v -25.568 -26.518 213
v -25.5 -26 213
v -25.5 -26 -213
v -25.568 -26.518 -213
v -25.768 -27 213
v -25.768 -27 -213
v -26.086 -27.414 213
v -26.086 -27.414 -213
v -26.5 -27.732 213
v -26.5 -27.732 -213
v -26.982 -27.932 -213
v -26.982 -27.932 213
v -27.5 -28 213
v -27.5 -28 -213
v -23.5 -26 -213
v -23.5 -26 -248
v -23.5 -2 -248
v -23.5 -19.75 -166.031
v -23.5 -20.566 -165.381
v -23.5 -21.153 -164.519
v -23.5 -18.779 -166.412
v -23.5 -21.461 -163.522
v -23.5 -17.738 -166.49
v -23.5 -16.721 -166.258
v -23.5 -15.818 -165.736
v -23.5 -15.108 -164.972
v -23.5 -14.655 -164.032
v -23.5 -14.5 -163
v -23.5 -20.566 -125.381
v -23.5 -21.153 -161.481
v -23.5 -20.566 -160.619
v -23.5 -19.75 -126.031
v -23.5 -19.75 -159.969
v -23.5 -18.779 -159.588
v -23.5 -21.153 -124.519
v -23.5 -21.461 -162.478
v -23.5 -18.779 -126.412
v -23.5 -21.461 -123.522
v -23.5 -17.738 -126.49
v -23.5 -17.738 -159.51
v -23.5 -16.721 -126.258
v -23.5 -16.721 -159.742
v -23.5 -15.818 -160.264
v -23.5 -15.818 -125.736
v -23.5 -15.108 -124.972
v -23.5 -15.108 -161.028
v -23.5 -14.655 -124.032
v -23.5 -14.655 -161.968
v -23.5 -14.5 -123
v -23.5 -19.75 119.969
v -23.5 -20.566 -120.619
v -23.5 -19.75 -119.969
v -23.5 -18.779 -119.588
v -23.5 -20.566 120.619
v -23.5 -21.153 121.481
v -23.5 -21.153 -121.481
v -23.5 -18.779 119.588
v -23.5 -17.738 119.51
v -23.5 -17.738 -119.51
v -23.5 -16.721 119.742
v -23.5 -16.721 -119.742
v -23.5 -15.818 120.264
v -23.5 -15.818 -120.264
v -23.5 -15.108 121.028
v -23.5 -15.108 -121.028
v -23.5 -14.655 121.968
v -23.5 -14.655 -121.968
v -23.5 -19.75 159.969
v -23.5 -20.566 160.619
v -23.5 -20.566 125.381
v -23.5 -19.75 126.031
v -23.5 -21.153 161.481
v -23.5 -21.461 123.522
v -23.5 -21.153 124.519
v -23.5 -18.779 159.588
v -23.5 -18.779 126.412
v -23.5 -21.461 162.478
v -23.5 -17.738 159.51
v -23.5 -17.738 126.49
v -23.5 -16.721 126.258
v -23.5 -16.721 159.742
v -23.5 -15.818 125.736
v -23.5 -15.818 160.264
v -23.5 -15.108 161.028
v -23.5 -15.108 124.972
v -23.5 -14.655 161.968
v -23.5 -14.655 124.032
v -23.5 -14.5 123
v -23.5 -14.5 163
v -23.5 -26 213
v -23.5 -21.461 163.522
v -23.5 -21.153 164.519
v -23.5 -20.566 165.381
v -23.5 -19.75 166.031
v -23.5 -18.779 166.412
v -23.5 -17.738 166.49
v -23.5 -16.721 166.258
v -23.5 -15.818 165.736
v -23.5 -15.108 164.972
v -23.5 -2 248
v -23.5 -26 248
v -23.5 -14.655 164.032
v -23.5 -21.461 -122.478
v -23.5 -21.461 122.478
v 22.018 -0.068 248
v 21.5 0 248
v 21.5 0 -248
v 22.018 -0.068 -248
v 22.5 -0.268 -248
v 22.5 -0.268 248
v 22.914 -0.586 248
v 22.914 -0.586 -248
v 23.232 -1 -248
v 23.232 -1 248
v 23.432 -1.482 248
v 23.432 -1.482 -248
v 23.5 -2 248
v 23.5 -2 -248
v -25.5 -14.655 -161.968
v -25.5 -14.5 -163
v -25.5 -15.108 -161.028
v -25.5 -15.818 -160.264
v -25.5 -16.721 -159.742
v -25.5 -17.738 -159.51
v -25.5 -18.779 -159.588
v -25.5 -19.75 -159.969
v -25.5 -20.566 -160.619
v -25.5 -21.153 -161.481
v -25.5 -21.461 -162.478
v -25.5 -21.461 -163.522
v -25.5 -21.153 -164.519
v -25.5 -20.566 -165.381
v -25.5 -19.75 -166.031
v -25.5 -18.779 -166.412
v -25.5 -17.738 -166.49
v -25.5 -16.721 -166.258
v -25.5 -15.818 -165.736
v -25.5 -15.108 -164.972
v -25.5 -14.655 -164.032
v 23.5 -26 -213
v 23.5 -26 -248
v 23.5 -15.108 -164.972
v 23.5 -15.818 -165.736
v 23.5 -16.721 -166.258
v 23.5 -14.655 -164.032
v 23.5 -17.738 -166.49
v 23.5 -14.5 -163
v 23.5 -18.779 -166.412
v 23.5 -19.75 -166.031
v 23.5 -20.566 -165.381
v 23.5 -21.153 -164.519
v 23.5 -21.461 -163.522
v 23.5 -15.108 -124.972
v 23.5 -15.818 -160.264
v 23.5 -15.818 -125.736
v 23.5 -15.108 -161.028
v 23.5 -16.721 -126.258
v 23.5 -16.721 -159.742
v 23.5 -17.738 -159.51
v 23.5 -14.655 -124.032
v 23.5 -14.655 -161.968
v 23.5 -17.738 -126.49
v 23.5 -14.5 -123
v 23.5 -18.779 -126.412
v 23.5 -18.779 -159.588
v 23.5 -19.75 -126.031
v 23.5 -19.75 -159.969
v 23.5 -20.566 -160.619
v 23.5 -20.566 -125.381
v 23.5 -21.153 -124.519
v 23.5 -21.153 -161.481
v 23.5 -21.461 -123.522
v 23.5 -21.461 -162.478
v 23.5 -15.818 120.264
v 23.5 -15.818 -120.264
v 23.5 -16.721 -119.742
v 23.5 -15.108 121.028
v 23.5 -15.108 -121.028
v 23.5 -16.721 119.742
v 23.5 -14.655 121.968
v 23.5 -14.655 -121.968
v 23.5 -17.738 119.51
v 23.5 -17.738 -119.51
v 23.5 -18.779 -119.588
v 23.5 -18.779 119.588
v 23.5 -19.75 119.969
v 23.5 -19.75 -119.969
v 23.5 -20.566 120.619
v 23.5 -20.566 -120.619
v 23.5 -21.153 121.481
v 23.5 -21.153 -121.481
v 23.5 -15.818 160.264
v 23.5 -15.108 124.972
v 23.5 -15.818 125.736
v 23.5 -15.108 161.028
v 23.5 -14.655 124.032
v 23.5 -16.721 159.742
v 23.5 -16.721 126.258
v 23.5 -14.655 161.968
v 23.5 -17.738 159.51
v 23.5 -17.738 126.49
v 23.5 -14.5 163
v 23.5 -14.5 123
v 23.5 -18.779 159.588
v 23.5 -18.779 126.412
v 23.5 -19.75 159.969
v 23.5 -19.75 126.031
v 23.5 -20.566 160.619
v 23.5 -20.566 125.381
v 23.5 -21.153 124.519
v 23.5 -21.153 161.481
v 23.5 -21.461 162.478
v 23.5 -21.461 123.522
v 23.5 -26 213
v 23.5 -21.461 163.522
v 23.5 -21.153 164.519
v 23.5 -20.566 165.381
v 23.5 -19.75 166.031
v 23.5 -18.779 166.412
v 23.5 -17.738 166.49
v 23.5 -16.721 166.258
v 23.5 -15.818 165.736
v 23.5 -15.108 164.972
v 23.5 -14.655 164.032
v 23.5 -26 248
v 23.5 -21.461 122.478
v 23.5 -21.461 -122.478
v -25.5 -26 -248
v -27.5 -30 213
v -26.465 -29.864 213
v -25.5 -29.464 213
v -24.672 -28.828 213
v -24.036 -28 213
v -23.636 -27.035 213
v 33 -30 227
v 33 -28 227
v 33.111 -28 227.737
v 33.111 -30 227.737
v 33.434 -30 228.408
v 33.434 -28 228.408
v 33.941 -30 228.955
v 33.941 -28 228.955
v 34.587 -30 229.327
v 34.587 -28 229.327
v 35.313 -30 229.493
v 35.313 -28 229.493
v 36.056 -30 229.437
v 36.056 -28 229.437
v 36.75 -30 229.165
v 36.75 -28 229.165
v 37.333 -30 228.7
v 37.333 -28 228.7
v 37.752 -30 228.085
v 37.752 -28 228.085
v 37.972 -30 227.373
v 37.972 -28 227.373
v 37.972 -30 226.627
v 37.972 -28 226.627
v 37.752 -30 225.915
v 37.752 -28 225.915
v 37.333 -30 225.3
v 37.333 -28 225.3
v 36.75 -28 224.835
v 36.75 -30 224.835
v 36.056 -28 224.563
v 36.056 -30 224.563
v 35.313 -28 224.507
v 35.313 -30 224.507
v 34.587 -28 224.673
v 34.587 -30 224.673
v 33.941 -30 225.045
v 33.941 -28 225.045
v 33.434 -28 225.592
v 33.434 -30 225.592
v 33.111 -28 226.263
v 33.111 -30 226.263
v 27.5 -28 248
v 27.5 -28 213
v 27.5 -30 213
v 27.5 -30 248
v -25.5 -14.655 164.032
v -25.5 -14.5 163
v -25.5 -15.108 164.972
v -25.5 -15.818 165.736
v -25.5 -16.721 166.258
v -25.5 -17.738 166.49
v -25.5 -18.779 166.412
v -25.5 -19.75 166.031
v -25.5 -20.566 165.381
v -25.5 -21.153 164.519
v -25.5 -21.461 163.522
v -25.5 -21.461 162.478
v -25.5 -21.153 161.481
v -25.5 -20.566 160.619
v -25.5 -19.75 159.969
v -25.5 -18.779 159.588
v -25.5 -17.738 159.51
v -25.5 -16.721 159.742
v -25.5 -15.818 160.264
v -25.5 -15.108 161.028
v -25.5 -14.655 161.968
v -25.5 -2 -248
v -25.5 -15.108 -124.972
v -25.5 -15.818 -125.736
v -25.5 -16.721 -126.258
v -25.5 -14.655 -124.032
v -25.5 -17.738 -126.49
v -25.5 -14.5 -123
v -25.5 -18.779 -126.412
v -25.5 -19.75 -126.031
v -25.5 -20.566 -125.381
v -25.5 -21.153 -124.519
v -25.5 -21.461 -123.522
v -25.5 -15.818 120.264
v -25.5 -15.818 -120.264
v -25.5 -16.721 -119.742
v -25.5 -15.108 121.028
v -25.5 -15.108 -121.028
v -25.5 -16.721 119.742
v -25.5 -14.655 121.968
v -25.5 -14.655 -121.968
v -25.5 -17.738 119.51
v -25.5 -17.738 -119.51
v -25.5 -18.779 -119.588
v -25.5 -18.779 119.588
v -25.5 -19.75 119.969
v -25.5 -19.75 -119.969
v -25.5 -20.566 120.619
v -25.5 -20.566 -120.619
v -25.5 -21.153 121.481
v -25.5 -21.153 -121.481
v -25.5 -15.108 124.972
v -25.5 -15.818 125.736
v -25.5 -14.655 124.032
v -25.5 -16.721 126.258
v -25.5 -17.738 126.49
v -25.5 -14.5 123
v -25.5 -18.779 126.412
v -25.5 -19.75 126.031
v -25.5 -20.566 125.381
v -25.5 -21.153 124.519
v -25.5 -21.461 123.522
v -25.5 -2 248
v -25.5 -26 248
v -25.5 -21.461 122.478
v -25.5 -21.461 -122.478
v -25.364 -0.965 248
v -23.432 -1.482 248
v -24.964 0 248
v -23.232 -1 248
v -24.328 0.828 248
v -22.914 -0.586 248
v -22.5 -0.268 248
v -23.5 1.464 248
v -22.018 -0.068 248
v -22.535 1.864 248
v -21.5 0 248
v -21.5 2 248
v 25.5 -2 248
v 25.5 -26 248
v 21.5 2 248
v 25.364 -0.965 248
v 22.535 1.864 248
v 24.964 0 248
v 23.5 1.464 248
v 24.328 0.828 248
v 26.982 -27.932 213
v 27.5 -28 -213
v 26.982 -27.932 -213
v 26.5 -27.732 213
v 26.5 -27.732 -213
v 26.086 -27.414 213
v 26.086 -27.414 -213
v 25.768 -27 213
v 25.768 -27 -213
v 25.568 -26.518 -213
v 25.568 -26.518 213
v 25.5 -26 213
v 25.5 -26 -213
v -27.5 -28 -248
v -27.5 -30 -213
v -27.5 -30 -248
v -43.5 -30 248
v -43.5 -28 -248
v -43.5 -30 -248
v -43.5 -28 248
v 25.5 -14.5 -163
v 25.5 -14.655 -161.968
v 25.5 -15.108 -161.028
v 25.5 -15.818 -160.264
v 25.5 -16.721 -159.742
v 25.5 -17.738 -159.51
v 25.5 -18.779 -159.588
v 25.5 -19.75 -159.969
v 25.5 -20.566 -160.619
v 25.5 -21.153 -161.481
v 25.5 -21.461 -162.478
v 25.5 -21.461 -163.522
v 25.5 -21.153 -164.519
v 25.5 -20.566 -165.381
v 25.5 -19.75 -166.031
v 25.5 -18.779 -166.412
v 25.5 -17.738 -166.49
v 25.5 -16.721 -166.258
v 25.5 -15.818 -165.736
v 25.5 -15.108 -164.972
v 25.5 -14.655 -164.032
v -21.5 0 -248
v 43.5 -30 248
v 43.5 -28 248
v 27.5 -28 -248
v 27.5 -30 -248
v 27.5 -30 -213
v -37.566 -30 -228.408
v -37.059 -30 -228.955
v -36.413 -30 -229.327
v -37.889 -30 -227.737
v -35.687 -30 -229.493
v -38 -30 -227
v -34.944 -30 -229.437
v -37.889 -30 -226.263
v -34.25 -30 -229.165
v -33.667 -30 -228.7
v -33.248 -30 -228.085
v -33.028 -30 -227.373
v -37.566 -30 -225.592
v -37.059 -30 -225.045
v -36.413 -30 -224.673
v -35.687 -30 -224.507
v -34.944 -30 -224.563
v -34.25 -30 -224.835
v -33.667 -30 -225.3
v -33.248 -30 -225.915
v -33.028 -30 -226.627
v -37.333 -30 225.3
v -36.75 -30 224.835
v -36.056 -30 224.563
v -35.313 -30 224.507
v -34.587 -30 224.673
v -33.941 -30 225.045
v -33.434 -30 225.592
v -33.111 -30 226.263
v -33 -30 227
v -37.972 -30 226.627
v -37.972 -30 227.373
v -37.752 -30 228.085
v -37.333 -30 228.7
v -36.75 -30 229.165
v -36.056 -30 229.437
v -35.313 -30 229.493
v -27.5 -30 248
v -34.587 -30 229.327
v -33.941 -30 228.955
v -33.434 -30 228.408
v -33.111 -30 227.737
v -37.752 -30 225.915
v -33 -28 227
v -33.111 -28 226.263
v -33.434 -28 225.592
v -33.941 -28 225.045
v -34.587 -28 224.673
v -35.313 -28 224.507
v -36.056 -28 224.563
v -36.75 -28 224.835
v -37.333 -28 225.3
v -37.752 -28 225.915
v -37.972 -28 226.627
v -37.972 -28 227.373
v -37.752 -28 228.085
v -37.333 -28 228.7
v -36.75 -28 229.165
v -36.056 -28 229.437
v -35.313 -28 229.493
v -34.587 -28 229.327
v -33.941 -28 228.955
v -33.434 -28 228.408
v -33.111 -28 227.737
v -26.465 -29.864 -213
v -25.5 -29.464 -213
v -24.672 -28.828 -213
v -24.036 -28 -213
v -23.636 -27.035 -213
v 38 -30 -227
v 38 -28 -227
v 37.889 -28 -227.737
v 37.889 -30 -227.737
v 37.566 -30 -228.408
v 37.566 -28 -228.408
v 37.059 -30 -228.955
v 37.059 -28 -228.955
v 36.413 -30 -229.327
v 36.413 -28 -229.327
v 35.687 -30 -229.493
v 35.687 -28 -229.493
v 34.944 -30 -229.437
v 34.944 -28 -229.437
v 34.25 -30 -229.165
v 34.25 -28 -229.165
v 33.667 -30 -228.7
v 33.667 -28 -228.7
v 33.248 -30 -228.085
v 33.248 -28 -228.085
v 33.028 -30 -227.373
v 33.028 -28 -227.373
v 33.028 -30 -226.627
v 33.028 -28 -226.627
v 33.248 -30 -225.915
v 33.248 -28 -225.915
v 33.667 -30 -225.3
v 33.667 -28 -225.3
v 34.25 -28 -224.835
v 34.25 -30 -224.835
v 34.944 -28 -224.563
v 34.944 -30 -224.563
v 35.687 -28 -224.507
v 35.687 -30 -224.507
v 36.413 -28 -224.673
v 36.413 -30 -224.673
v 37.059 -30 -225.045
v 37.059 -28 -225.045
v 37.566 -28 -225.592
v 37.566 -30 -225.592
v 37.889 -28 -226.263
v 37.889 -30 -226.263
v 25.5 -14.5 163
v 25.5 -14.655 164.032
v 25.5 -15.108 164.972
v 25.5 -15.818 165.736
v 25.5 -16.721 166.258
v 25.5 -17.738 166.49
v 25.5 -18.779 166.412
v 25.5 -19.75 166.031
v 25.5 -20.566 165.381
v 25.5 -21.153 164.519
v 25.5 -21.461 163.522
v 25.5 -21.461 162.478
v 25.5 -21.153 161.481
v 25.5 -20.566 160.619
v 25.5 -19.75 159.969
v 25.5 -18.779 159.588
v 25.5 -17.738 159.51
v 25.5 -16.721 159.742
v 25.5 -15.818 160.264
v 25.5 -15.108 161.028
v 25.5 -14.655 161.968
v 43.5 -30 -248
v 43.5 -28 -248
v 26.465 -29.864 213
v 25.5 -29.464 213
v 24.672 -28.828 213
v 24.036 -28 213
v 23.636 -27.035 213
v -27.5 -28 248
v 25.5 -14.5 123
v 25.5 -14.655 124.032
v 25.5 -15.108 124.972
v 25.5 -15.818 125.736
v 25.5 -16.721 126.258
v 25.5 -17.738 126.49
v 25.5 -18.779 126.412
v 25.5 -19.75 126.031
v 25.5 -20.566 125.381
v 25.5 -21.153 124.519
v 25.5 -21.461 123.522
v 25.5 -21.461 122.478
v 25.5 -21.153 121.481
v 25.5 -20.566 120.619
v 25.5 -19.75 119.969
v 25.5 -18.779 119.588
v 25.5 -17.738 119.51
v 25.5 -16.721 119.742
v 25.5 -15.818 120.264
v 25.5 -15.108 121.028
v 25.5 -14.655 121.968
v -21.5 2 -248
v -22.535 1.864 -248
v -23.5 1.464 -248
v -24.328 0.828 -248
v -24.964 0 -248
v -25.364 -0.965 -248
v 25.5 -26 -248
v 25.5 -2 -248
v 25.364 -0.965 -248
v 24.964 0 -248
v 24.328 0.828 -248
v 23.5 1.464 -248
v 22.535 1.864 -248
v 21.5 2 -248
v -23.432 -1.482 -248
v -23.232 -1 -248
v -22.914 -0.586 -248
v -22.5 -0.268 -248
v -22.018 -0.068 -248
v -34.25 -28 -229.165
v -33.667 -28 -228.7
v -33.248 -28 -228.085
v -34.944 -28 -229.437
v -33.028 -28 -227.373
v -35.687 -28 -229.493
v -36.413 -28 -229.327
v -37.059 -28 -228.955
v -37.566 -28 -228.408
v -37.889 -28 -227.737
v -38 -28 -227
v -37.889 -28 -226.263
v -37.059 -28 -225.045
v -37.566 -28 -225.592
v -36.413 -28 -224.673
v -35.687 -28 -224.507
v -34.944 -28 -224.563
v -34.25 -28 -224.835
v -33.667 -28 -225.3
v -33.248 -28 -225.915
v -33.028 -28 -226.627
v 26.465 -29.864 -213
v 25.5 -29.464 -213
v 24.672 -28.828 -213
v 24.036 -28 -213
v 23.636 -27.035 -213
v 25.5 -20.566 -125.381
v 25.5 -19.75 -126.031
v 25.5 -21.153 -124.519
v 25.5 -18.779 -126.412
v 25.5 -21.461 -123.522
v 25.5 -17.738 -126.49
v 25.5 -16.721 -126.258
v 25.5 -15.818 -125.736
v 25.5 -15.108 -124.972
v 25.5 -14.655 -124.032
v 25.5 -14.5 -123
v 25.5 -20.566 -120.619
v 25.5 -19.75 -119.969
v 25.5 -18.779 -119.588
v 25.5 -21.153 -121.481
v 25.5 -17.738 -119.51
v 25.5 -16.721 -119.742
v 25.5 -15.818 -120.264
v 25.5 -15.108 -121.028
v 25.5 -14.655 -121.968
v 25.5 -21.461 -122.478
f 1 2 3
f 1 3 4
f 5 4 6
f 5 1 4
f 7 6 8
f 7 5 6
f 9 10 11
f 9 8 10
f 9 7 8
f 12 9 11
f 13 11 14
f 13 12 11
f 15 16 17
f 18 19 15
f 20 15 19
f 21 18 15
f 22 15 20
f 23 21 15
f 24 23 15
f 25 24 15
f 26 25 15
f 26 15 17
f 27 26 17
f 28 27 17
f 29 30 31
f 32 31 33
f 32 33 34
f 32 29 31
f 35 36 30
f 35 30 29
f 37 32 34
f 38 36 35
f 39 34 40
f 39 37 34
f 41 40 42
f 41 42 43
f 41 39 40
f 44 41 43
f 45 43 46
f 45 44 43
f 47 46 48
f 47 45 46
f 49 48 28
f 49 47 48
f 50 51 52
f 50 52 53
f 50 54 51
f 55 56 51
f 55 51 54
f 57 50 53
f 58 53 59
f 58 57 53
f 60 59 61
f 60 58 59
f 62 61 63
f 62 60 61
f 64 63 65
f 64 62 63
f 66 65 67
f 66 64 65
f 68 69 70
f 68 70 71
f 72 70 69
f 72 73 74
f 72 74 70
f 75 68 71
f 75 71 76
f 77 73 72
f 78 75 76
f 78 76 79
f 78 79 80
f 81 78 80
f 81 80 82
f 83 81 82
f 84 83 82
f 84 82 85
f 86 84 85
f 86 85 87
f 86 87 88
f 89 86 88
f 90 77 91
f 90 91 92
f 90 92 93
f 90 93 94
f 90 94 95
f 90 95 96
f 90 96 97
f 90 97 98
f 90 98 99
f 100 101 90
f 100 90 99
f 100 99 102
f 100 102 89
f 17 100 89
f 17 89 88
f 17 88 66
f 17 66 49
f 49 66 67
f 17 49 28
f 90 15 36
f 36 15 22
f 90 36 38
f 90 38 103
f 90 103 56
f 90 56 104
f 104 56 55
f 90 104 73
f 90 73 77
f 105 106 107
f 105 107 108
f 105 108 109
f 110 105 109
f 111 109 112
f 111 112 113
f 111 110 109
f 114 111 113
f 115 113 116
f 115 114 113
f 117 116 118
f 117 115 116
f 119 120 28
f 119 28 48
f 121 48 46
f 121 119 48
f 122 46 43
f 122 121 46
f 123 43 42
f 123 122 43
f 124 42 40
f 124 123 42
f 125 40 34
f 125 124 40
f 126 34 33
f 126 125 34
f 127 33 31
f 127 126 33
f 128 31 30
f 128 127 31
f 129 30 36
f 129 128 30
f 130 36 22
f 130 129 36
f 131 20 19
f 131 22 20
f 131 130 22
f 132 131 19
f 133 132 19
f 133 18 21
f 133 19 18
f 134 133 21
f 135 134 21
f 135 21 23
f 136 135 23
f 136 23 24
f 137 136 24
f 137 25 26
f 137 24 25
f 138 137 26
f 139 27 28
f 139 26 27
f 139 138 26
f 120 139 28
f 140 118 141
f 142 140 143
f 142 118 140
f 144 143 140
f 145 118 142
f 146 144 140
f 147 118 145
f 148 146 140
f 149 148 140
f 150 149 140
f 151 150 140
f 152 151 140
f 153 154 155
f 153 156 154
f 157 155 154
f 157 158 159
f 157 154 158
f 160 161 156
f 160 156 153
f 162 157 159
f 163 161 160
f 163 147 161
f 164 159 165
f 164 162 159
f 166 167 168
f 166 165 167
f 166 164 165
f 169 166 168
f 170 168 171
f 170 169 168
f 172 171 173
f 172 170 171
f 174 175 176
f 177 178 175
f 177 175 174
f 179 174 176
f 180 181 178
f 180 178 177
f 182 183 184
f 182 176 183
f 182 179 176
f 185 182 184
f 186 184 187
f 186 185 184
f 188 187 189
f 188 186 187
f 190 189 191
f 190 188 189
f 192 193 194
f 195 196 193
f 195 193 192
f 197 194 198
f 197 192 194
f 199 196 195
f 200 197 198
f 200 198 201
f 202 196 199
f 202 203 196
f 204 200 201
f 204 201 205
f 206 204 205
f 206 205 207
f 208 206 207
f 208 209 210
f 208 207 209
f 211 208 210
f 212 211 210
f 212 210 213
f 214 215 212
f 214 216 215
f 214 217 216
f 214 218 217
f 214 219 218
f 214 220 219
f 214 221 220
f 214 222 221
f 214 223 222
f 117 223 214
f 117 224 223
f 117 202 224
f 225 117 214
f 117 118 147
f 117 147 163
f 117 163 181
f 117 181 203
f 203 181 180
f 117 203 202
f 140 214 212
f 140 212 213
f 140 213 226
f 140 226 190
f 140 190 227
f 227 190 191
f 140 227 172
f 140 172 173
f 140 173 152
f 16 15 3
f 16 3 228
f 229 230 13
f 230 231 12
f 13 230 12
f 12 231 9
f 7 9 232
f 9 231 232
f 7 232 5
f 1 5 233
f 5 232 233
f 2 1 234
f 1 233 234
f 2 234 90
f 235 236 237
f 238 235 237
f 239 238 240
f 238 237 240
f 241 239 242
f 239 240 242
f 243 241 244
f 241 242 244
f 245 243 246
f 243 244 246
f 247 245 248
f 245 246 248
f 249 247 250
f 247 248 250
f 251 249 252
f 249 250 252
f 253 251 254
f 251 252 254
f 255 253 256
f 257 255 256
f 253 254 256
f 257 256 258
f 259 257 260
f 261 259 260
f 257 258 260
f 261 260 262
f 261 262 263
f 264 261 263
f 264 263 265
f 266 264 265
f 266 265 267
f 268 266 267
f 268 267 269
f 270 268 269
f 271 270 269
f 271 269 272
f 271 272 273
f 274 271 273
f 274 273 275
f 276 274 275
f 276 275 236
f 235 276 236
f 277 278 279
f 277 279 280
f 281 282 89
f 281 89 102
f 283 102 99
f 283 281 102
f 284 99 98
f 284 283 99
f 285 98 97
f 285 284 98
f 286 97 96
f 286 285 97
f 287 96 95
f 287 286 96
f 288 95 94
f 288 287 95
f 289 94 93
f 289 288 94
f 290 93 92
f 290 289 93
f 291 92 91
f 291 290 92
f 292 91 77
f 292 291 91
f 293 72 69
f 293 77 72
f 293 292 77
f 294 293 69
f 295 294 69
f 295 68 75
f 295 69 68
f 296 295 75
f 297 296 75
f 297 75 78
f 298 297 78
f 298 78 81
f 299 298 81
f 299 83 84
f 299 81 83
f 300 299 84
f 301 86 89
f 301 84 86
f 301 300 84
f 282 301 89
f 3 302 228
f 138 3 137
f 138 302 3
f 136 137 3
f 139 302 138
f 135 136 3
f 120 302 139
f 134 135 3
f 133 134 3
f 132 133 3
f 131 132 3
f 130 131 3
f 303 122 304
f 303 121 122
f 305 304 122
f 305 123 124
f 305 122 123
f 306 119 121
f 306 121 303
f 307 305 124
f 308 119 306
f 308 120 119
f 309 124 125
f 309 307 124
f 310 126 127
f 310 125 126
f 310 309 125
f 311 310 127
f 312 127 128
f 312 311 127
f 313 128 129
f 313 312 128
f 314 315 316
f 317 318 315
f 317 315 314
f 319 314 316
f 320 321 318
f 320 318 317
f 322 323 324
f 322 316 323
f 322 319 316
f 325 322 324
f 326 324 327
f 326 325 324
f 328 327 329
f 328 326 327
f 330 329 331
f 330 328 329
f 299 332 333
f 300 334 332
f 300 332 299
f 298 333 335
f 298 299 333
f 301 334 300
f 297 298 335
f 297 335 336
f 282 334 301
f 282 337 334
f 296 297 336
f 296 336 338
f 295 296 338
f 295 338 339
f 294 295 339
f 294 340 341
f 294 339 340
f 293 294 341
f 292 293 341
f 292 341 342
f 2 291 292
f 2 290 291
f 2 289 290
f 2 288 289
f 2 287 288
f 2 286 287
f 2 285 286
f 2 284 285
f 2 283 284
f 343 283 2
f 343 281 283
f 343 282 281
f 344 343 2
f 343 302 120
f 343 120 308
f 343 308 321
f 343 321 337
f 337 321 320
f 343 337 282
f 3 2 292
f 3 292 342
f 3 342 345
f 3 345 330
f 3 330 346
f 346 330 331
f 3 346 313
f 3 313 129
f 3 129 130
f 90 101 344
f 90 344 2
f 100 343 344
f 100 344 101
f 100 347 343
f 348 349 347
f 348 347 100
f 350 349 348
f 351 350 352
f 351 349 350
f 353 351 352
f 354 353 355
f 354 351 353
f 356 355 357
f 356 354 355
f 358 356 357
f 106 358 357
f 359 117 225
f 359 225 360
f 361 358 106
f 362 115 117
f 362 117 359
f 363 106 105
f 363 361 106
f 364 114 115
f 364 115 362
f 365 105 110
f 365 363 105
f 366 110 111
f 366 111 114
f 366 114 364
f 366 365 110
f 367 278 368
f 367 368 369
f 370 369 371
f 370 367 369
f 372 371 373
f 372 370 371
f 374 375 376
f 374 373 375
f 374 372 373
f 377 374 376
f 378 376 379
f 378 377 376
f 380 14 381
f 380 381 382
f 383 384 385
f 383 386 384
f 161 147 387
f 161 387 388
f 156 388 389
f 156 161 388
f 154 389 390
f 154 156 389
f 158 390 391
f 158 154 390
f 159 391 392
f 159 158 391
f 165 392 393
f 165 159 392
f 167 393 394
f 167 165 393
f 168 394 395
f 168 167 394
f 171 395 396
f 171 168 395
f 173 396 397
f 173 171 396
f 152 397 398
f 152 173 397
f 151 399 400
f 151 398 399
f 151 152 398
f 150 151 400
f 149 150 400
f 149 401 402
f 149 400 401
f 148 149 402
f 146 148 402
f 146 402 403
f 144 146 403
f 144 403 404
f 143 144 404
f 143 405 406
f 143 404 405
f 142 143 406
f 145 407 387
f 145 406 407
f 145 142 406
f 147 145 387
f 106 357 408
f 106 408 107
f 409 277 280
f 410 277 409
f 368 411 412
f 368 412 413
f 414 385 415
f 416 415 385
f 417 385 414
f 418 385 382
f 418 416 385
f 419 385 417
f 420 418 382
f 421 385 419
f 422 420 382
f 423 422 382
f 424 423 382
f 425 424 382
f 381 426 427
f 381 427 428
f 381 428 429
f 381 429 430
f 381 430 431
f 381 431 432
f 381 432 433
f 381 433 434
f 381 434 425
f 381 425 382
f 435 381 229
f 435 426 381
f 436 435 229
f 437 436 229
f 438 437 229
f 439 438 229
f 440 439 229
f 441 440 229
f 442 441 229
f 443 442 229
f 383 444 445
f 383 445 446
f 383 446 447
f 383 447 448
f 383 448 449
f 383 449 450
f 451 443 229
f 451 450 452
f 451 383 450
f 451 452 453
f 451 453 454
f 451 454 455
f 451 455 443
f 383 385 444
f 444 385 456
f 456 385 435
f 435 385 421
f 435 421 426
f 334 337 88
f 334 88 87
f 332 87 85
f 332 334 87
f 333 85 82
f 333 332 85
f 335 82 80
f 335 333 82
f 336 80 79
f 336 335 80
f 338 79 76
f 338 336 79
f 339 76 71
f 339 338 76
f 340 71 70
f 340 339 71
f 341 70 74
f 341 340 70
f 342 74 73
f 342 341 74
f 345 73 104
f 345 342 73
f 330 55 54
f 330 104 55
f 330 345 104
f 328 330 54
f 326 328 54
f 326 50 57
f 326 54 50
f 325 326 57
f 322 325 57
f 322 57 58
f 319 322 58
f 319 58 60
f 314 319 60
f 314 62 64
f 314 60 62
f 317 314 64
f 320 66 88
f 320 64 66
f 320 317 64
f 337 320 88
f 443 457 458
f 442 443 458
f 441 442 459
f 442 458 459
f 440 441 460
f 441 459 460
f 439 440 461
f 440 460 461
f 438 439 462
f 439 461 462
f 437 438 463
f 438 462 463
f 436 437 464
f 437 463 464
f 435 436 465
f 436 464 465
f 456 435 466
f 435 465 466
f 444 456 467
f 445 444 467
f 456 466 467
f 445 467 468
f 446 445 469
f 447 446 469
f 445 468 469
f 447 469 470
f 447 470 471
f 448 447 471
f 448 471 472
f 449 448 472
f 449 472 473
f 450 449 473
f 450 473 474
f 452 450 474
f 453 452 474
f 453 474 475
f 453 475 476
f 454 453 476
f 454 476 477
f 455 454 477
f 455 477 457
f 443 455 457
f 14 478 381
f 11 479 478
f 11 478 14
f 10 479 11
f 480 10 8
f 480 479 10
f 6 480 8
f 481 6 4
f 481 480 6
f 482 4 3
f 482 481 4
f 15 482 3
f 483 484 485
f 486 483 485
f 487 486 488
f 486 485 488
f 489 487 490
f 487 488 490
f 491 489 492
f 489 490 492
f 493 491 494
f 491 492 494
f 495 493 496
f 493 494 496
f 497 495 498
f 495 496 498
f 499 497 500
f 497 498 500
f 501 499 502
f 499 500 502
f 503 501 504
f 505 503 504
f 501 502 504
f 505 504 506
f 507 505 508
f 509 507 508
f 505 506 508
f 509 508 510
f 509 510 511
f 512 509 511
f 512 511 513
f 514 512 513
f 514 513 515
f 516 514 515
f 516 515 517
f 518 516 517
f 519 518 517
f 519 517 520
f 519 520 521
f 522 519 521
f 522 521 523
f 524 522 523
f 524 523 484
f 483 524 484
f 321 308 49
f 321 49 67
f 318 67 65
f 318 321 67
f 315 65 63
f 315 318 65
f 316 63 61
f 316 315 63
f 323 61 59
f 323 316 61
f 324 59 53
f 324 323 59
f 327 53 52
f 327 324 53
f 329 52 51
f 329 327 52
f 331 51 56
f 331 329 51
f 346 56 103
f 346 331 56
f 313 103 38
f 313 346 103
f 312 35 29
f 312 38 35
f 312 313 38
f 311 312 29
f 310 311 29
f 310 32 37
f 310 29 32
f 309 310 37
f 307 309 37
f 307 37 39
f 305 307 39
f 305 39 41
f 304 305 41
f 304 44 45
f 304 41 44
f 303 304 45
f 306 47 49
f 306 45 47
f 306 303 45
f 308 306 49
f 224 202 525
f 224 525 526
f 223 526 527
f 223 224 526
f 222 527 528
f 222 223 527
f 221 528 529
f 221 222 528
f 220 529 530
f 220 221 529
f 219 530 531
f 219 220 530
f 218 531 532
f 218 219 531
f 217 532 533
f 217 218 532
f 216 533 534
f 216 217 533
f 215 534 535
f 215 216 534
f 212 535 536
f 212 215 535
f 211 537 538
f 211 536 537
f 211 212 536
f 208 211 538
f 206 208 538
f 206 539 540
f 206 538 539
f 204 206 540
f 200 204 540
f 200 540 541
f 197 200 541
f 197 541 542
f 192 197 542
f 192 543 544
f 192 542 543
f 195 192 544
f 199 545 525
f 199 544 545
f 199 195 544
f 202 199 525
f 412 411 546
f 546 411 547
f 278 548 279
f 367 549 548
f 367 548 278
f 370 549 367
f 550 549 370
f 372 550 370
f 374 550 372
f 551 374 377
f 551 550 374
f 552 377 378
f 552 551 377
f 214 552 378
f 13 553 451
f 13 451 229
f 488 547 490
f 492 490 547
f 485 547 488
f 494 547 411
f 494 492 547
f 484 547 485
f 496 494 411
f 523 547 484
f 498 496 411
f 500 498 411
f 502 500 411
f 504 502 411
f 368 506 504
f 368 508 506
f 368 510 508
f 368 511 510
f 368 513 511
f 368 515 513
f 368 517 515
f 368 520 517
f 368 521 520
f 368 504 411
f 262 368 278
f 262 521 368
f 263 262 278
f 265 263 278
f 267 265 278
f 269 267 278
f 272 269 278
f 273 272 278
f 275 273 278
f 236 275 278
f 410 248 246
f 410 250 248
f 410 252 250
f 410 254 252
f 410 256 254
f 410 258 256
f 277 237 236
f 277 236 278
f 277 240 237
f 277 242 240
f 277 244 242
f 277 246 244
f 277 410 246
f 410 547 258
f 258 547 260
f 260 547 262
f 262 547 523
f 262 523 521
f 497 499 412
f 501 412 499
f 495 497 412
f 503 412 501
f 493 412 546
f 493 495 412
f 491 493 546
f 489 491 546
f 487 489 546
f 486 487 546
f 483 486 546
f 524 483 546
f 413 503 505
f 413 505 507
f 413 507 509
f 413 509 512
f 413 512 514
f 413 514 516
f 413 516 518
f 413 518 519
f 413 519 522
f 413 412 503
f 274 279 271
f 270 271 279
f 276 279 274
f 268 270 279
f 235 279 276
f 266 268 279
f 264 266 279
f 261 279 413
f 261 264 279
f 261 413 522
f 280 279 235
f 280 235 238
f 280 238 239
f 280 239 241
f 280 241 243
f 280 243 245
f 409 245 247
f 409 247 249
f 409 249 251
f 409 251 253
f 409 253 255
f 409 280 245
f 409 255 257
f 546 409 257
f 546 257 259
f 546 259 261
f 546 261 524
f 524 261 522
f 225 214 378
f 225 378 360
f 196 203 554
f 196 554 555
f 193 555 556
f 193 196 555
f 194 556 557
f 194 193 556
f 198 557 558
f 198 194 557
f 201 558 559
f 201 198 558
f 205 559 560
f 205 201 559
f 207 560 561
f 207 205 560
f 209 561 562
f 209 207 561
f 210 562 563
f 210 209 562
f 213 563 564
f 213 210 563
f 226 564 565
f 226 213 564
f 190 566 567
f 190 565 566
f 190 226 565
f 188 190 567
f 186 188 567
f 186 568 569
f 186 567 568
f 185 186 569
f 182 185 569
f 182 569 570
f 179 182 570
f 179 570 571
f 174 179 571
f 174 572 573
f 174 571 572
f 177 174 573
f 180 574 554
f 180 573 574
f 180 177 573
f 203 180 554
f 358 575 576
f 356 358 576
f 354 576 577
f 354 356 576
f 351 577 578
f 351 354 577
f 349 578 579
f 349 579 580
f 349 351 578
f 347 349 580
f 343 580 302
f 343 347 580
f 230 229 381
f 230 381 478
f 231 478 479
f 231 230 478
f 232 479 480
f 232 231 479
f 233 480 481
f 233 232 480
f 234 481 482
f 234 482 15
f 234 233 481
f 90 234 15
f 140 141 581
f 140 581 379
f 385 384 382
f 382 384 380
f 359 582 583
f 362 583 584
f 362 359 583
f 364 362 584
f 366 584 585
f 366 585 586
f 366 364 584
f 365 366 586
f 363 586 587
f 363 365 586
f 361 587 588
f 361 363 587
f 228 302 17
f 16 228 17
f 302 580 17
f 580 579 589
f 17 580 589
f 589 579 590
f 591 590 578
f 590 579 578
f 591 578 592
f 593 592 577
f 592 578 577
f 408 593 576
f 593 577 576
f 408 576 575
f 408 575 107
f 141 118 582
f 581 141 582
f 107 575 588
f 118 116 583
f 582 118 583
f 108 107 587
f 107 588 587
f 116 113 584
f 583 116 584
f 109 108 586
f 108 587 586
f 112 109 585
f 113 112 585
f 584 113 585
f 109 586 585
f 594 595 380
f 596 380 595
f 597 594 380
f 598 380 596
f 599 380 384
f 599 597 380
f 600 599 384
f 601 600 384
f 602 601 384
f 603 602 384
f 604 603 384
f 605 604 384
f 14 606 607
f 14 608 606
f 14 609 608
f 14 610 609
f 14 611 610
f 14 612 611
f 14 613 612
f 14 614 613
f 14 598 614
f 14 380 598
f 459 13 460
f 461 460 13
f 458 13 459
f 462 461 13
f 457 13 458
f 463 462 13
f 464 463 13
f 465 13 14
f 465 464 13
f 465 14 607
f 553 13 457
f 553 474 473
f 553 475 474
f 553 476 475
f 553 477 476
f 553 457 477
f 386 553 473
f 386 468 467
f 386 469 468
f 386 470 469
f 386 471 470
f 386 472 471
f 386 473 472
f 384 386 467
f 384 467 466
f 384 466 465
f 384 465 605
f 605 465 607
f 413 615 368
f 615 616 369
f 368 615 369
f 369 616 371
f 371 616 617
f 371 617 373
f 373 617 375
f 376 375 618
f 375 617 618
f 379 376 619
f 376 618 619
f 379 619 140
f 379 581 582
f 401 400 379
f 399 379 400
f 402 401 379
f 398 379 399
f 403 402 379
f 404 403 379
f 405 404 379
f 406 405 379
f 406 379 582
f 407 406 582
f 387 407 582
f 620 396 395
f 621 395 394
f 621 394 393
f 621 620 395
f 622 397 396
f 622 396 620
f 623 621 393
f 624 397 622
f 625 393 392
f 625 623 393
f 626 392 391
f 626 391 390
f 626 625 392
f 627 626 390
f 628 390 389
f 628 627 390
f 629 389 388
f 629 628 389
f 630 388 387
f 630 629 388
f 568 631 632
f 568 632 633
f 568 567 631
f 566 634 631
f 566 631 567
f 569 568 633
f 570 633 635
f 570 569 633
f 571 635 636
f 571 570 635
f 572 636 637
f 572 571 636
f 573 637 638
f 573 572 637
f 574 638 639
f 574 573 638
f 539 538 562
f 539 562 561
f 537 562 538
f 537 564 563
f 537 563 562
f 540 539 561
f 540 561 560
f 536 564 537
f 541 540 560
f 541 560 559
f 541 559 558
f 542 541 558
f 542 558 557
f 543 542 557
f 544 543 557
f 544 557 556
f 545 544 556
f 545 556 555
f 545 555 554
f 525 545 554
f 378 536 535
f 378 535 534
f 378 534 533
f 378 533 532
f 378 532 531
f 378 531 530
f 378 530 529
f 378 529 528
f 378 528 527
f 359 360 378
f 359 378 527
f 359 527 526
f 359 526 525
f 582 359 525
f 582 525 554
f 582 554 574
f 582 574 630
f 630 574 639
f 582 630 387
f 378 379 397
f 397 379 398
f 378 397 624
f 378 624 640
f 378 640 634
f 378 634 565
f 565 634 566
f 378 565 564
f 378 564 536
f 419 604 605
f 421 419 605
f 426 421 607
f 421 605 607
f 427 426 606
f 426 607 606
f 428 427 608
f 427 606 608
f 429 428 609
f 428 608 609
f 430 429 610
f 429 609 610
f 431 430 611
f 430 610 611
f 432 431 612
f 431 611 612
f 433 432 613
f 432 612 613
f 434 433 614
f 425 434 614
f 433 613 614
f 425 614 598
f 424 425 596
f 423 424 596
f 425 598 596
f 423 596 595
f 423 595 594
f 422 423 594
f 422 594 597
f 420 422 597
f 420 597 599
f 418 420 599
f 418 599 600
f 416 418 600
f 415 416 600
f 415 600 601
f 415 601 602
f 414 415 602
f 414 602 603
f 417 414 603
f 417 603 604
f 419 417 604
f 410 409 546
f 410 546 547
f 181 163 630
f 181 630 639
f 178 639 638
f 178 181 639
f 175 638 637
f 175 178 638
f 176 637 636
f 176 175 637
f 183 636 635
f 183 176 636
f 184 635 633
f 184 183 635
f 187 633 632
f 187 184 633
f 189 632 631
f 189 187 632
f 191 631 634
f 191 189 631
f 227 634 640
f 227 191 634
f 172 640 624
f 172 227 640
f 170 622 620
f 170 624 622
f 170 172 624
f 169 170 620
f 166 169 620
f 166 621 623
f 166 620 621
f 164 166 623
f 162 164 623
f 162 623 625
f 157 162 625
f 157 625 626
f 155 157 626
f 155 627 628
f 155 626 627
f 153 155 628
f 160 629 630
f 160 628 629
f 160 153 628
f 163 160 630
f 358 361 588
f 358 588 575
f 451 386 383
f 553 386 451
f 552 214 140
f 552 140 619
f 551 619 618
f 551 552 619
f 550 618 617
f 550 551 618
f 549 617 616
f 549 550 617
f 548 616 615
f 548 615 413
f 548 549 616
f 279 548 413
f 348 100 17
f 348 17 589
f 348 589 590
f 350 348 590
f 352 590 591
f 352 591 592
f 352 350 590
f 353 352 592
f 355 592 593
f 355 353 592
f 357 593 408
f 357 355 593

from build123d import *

# Parameters (mm, degrees)
SM_BASE_FLANGE_1_DEPTH   = 248
SKETCH_7_W               = 35
SKETCH_7_H               = 4
CUT_EXTRUDE_1_DEPTH      = 4
SKETCH_8_W               = 35
SKETCH_8_H               = 4
CUT_EXTRUDE_2_DEPTH      = 4
SKETCH_9_R               = 2.5
CUT_EXTRUDE_3_DEPTH      = 4
SKETCH_11_W              = 8.403654654
SKETCH_11_H              = 30.785672442
SKETCH_11_H_2            = 25.612573904
SM_BASE_FLANGE_1_2_DEPTH = 2
CUT_EXTRUDE_5_DEPTH      = 259.636810992
CUT_EXTRUDE_5_DEPTH_BACK = 259.636810992
SKETCH_14_R              = 3.5


# Sheet-metal steps are written as plain solids
with BuildPart() as part:
    # Sketch 1 → Sm Base Flange 1 (new, symmetric)
    with BuildSketch(Plane.XY):
        with BuildLine():
            Line((-43.5, -30), (-27.5, -30))
            ThreePointArc((-27.5, -30), (-24.671572875, -28.828427125), (-23.5, -26))
            Line((-23.5, -26), (-23.5, -2))
            ThreePointArc((-23.5, -2), (-22.914213562, -0.585786438), (-21.5, 0))
            Line((-21.5, 0), (21.5, 0))
            ThreePointArc((21.5, 0), (22.914213562, -0.585786438), (23.5, -2))
            Line((23.5, -2), (23.5, -26))
            ThreePointArc((23.5, -26), (24.671572875, -28.828427125), (27.5, -30))
            Line((27.5, -30), (43.5, -30))
            Line((43.5, -30), (43.5, -28))
            Line((43.5, -28), (27.5, -28))
            ThreePointArc((27.5, -28), (26.085786438, -27.414213562), (25.5, -26))
            Line((25.5, -26), (25.5, -2))
            ThreePointArc((25.5, -2), (24.328427125, 0.828427125), (21.5, 2))
            Line((21.5, 2), (-21.5, 2))
            ThreePointArc((-21.5, 2), (-24.328427125, 0.828427125), (-25.5, -2))
            Line((-25.5, -2), (-25.5, -26))
            ThreePointArc((-25.5, -26), (-26.085786438, -27.414213562), (-27.5, -28))
            Line((-27.5, -28), (-43.5, -28))
            Line((-43.5, -28), (-43.5, -30))
        make_face()
    extrude(amount=SM_BASE_FLANGE_1_DEPTH, both=True)

    # Эскиз7 → Вырез-Вытянуть1 (cut)
    with BuildSketch(Plane.ZY.offset(-23.5)):
        with Locations((230.5, -28)):
            Rectangle(SKETCH_7_W, SKETCH_7_H)
        with Locations((-230.5, -28)):
            Rectangle(SKETCH_7_W, SKETCH_7_H)
    extrude(amount=-CUT_EXTRUDE_1_DEPTH, mode=Mode.SUBTRACT)

    # Эскиз8 → Вырез-Вытянуть2 (cut)
    with BuildSketch(Plane(origin=(-23.5, 0, 0), x_dir=(0, 0, -1), z_dir=(1, 0, 0))):
        with Locations((230.5, -28)):
            Rectangle(SKETCH_8_W, SKETCH_8_H)
        with Locations((-230.5, -28)):
            Rectangle(SKETCH_8_W, SKETCH_8_H)
    extrude(amount=-CUT_EXTRUDE_2_DEPTH, mode=Mode.SUBTRACT)

    # Эскиз9 → Вырез-Вытянуть3 (cut)
    with BuildSketch(Plane(origin=(0, -28, 0), x_dir=(1, 0, 0), z_dir=(0, 1, 0))):
        with Locations(Location((-35.5, 227, 0), (0, 0, 180))):
            Circle(SKETCH_9_R)
        with Locations(Location((-34.5, 195, 0), (0, 0, 180))):
            Circle(SKETCH_9_R)
        with Locations(Location((-34.5, 179, 0), (0, 0, 180))):
            Circle(SKETCH_9_R)
        with Locations((-34.5, -179)):
            Circle(SKETCH_9_R)
        with Locations((-34.5, -195)):
            Circle(SKETCH_9_R)
        with Locations((-35.5, -227)):
            Circle(SKETCH_9_R)
        with Locations((35.5, 227)):
            Circle(SKETCH_9_R)
        with Locations(Location((35.5, -227, 0), (0, 0, 180))):
            Circle(SKETCH_9_R)
    extrude(amount=-CUT_EXTRUDE_3_DEPTH, mode=Mode.SUBTRACT)

    # Эскиз11 → Sm Base Flange 1 2 (add)
    with BuildSketch(Plane(origin=(0, -28, 0), x_dir=(1, 0, 0), z_dir=(0, 1, 0))):
        with Locations((-34.752058472, -185.409493447)):
            Rectangle(SKETCH_11_W, SKETCH_11_H)
        with Locations((-34.752058472, 186.746789547)):
            Rectangle(SKETCH_11_W, SKETCH_11_H_2)
    extrude(amount=-SM_BASE_FLANGE_1_2_DEPTH)

    # Эскиз14 → Вырез-Вытянуть5 (cut, two sides: drawn at the far end of the back side and taken through both)
    with BuildSketch(Plane(origin=(-23.5, 0, 0), x_dir=(0, 0, -1), z_dir=(1, 0, 0)).offset(-CUT_EXTRUDE_5_DEPTH_BACK)):
        with Locations(Location((-163, -18, 0), (0, 0, 90))):
            Circle(SKETCH_14_R)
        with Locations(Location((-123, -18, 0), (0, 0, 90))):
            Circle(SKETCH_14_R)
        with Locations(Location((123, -18, 0), (0, 0, 90))):
            Circle(SKETCH_14_R)
        with Locations(Location((163, -18, 0), (0, 0, 90))):
            Circle(SKETCH_14_R)
    extrude(amount=CUT_EXTRUDE_5_DEPTH + CUT_EXTRUDE_5_DEPTH_BACK, mode=Mode.SUBTRACT)


solid = part.part
